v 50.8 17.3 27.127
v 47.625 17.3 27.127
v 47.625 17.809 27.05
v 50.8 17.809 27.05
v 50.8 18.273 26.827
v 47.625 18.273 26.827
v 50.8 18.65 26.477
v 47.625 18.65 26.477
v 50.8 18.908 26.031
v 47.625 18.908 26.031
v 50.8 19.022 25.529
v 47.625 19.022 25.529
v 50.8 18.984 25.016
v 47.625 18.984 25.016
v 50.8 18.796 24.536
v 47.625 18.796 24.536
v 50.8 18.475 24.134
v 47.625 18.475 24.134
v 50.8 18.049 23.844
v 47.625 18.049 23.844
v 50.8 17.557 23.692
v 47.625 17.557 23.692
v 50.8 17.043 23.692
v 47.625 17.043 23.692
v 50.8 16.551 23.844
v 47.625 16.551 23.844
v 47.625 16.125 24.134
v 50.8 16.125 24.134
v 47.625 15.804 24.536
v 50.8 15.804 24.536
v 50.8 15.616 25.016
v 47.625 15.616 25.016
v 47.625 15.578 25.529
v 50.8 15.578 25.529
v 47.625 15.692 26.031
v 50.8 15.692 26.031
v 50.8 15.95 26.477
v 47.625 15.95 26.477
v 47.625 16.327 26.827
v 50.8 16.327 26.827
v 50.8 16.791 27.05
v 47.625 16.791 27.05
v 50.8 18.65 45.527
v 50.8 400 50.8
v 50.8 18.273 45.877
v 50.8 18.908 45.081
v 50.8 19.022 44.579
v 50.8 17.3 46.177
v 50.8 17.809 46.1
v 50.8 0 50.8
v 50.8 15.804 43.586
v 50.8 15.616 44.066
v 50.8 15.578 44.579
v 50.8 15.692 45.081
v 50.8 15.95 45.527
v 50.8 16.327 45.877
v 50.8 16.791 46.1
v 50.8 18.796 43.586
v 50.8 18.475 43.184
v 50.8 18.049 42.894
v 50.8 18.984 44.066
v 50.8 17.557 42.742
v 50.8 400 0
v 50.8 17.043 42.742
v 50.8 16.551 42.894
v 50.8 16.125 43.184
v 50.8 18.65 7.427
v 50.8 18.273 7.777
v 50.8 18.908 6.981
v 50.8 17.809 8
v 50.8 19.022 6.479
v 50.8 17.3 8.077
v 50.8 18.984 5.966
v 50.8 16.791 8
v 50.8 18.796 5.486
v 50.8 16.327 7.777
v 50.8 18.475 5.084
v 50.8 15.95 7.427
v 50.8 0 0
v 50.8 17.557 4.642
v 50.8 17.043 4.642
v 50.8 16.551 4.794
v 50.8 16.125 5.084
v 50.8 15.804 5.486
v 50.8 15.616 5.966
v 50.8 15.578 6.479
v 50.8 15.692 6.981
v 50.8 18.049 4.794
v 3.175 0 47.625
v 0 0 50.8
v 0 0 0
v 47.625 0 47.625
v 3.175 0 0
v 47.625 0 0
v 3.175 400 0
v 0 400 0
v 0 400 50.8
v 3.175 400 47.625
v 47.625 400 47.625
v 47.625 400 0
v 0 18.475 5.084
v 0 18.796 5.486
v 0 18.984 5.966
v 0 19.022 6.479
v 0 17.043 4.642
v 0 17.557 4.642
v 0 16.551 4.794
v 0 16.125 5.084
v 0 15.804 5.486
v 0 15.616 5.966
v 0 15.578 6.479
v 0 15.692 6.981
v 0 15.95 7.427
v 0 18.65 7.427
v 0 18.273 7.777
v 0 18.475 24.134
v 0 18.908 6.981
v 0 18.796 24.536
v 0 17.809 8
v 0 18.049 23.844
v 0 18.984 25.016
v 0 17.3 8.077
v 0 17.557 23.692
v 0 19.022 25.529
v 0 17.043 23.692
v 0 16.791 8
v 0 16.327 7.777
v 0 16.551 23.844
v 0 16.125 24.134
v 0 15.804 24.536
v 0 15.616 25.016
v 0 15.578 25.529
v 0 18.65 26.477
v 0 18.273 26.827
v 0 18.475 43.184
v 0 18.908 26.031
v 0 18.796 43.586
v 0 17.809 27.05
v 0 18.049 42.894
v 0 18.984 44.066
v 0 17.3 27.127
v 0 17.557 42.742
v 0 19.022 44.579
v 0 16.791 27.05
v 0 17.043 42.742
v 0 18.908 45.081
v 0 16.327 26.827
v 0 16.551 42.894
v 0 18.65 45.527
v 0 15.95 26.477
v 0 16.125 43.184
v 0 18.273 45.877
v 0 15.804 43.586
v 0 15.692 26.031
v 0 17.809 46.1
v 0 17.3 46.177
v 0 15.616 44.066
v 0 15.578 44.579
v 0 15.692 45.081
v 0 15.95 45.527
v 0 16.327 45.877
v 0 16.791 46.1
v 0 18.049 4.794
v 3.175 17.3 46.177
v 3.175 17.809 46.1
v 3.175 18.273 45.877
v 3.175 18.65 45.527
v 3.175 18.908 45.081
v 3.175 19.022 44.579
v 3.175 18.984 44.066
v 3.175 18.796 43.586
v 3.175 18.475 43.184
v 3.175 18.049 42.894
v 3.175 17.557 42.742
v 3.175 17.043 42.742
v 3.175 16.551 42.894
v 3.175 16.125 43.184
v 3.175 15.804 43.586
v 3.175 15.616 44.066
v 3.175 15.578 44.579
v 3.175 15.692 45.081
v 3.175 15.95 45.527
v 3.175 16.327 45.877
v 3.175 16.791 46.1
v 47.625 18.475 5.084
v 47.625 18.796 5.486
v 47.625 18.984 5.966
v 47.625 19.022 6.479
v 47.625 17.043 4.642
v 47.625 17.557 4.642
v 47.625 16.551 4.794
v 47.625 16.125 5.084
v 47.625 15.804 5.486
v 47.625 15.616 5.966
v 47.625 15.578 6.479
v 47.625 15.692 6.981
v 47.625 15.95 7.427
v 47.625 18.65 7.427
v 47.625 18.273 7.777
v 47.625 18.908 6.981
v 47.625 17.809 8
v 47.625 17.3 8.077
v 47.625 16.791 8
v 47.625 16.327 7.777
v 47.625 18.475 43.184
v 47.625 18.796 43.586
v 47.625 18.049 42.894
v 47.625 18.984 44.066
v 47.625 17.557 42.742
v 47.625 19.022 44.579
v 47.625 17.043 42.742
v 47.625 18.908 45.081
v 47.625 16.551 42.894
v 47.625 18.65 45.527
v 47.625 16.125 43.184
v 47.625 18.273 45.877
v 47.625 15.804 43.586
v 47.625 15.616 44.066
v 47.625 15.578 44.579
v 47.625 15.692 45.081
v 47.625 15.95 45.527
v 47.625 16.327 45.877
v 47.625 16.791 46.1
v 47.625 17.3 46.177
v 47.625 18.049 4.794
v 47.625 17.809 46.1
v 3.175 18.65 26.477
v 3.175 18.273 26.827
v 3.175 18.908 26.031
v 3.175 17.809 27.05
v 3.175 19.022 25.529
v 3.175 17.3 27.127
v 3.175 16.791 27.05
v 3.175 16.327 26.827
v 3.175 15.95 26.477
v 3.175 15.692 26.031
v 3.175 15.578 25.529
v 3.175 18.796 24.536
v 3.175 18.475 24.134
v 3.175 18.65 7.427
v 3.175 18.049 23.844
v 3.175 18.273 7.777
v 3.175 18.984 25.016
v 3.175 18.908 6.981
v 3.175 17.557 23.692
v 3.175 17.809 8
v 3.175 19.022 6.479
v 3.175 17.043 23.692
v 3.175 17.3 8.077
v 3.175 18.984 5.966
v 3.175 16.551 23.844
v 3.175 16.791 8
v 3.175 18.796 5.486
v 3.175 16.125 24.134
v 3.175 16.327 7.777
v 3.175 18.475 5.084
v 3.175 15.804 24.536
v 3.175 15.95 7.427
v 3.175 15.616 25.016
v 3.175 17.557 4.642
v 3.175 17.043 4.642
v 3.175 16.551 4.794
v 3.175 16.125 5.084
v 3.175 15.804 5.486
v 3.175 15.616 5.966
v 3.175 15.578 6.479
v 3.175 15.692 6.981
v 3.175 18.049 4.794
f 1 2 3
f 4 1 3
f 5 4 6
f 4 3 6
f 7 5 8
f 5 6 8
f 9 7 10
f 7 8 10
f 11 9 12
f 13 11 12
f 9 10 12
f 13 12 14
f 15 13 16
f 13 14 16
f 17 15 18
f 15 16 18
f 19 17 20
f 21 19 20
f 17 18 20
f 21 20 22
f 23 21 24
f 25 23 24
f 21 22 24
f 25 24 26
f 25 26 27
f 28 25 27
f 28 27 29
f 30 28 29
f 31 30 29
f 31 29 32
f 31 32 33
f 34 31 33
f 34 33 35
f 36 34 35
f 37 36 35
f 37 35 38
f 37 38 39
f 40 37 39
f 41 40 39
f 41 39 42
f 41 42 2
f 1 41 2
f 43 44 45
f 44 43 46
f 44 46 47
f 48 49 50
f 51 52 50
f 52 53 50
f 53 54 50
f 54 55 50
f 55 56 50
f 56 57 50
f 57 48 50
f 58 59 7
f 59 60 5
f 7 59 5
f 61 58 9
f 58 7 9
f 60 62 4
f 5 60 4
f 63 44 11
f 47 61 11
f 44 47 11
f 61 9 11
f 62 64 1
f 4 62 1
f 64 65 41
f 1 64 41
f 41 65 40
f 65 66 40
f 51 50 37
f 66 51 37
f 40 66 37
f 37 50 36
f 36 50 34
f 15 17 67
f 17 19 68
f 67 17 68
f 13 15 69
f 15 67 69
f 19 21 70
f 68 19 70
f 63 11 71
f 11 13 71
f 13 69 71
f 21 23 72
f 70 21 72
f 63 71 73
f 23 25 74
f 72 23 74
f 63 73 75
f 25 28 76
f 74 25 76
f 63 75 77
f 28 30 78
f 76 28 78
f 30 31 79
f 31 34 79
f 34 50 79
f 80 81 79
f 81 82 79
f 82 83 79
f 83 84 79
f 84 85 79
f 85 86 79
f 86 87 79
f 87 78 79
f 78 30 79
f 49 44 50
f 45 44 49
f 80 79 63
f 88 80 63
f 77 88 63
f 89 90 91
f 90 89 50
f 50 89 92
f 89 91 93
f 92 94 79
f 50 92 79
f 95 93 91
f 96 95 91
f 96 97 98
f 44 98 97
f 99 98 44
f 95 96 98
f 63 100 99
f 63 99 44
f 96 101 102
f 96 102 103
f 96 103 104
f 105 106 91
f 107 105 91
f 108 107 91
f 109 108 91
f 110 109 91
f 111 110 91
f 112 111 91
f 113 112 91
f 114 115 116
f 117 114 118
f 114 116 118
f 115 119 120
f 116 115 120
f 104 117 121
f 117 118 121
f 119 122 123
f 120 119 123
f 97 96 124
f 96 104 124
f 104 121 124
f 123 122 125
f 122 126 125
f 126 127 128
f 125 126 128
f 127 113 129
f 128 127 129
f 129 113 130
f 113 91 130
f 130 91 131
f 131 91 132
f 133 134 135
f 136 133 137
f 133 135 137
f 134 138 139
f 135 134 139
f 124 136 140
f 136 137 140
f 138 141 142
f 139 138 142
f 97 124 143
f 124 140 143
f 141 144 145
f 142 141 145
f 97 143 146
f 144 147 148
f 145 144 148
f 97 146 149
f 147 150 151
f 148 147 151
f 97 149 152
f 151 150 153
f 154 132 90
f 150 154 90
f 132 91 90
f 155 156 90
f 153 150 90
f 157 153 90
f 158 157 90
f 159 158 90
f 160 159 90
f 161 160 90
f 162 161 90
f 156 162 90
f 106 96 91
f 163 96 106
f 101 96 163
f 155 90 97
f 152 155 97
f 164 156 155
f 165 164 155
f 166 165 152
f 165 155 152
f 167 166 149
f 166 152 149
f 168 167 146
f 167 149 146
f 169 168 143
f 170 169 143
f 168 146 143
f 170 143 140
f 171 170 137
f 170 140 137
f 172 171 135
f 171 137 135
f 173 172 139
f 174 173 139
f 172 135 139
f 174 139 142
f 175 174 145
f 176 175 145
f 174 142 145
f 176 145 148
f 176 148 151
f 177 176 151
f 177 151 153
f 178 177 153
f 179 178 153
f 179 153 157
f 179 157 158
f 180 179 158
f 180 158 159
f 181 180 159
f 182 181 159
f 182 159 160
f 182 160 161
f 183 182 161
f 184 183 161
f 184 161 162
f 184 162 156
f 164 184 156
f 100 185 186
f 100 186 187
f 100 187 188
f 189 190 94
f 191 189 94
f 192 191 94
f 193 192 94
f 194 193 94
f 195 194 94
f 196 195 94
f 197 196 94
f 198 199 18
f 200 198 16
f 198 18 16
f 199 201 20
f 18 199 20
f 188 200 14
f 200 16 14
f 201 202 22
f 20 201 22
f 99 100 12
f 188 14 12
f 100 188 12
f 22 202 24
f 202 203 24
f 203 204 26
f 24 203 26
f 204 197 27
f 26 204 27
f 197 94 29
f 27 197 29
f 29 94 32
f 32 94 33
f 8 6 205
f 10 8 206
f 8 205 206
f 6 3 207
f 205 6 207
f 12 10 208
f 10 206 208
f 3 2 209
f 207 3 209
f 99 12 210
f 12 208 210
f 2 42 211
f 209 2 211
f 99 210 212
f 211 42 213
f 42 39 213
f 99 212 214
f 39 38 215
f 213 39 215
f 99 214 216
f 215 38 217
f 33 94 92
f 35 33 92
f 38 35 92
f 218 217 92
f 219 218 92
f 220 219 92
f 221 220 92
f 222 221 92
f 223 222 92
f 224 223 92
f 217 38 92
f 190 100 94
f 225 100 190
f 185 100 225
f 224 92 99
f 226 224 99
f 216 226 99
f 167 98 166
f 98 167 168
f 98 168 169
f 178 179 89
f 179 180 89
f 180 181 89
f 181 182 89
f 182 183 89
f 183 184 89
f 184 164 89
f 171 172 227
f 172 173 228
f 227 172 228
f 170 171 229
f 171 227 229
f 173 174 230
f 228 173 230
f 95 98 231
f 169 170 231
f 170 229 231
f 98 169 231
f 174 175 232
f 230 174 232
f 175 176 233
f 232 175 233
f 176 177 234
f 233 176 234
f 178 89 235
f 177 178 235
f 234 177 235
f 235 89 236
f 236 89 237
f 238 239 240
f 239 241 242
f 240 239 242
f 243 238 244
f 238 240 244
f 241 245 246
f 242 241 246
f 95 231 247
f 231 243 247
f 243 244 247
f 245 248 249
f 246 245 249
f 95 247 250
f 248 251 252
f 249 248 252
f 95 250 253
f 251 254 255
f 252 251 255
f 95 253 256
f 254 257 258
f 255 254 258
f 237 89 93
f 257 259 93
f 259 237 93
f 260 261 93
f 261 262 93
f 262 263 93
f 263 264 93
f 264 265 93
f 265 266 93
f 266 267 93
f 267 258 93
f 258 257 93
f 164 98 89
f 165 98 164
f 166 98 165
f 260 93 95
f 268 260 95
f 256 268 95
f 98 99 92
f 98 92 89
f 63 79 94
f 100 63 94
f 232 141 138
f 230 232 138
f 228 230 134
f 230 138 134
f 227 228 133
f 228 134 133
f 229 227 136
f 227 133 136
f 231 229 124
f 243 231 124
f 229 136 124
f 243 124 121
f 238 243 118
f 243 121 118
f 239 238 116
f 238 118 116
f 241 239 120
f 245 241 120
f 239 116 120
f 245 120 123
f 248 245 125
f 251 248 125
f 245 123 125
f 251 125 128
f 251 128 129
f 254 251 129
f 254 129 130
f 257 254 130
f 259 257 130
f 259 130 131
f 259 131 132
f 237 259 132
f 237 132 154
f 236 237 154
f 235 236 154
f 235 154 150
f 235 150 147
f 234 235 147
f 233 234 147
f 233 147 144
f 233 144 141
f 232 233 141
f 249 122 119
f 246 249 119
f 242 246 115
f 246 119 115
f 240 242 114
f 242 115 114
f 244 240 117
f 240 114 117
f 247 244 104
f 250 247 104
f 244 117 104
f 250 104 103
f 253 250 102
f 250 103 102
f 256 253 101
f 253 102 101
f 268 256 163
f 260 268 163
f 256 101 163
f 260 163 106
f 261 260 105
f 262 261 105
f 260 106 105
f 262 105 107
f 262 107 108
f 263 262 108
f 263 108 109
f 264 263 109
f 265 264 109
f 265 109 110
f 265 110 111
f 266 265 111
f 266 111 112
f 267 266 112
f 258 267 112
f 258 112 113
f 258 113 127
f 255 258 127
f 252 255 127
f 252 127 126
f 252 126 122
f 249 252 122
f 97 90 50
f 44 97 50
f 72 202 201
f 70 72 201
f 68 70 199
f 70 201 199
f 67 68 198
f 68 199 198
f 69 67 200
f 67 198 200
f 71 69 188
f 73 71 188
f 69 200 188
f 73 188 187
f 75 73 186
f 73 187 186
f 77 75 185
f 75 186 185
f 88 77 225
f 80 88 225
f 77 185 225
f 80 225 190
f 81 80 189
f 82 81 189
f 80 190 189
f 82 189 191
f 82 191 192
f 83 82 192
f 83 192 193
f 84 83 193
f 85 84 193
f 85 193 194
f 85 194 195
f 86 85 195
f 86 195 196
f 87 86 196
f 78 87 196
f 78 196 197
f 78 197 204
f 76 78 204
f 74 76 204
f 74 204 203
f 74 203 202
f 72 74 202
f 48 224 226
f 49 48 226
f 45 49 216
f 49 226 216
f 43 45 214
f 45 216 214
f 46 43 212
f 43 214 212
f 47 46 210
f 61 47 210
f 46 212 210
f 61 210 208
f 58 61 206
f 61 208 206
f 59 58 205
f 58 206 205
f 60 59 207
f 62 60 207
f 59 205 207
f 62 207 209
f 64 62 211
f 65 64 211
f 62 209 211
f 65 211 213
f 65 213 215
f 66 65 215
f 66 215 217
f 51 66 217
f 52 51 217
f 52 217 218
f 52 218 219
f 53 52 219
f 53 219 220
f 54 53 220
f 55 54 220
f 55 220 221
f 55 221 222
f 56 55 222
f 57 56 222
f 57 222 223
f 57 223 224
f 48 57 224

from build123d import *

# Parameters (mm, degrees)
BOSS_EXTRUDE1_DEPTH       = 400
TAP_DRILL_FOR_8_32_TAP1_D = 3.4544


with BuildPart() as part:
    # Sketch1 → Boss-Extrude1 (new body)
    with BuildSketch(Plane(origin=(0, 0, 0), x_dir=(1, 0, 0), z_dir=(0, 1, 0))):
        Polygon((0, 0), (0, -50.8), (50.8, -50.8), (50.8, 0), (47.625, 0), (47.625, -47.625), (3.175, -47.625), (3.175, 0), align=None)
    extrude(amount=BOSS_EXTRUDE1_DEPTH)

    # Tap Drill for #8-32 Tap1 (through all)
    with Locations(Plane(origin=(50.8, 0, 0), x_dir=(0, 0, -1), z_dir=(1, 0, 0))):
        with Locations((-44.45, 17.3), (-25.4, 17.3), (-6.35, 17.3)):
            Hole(TAP_DRILL_FOR_8_32_TAP1_D / 2)


solid = part.part
